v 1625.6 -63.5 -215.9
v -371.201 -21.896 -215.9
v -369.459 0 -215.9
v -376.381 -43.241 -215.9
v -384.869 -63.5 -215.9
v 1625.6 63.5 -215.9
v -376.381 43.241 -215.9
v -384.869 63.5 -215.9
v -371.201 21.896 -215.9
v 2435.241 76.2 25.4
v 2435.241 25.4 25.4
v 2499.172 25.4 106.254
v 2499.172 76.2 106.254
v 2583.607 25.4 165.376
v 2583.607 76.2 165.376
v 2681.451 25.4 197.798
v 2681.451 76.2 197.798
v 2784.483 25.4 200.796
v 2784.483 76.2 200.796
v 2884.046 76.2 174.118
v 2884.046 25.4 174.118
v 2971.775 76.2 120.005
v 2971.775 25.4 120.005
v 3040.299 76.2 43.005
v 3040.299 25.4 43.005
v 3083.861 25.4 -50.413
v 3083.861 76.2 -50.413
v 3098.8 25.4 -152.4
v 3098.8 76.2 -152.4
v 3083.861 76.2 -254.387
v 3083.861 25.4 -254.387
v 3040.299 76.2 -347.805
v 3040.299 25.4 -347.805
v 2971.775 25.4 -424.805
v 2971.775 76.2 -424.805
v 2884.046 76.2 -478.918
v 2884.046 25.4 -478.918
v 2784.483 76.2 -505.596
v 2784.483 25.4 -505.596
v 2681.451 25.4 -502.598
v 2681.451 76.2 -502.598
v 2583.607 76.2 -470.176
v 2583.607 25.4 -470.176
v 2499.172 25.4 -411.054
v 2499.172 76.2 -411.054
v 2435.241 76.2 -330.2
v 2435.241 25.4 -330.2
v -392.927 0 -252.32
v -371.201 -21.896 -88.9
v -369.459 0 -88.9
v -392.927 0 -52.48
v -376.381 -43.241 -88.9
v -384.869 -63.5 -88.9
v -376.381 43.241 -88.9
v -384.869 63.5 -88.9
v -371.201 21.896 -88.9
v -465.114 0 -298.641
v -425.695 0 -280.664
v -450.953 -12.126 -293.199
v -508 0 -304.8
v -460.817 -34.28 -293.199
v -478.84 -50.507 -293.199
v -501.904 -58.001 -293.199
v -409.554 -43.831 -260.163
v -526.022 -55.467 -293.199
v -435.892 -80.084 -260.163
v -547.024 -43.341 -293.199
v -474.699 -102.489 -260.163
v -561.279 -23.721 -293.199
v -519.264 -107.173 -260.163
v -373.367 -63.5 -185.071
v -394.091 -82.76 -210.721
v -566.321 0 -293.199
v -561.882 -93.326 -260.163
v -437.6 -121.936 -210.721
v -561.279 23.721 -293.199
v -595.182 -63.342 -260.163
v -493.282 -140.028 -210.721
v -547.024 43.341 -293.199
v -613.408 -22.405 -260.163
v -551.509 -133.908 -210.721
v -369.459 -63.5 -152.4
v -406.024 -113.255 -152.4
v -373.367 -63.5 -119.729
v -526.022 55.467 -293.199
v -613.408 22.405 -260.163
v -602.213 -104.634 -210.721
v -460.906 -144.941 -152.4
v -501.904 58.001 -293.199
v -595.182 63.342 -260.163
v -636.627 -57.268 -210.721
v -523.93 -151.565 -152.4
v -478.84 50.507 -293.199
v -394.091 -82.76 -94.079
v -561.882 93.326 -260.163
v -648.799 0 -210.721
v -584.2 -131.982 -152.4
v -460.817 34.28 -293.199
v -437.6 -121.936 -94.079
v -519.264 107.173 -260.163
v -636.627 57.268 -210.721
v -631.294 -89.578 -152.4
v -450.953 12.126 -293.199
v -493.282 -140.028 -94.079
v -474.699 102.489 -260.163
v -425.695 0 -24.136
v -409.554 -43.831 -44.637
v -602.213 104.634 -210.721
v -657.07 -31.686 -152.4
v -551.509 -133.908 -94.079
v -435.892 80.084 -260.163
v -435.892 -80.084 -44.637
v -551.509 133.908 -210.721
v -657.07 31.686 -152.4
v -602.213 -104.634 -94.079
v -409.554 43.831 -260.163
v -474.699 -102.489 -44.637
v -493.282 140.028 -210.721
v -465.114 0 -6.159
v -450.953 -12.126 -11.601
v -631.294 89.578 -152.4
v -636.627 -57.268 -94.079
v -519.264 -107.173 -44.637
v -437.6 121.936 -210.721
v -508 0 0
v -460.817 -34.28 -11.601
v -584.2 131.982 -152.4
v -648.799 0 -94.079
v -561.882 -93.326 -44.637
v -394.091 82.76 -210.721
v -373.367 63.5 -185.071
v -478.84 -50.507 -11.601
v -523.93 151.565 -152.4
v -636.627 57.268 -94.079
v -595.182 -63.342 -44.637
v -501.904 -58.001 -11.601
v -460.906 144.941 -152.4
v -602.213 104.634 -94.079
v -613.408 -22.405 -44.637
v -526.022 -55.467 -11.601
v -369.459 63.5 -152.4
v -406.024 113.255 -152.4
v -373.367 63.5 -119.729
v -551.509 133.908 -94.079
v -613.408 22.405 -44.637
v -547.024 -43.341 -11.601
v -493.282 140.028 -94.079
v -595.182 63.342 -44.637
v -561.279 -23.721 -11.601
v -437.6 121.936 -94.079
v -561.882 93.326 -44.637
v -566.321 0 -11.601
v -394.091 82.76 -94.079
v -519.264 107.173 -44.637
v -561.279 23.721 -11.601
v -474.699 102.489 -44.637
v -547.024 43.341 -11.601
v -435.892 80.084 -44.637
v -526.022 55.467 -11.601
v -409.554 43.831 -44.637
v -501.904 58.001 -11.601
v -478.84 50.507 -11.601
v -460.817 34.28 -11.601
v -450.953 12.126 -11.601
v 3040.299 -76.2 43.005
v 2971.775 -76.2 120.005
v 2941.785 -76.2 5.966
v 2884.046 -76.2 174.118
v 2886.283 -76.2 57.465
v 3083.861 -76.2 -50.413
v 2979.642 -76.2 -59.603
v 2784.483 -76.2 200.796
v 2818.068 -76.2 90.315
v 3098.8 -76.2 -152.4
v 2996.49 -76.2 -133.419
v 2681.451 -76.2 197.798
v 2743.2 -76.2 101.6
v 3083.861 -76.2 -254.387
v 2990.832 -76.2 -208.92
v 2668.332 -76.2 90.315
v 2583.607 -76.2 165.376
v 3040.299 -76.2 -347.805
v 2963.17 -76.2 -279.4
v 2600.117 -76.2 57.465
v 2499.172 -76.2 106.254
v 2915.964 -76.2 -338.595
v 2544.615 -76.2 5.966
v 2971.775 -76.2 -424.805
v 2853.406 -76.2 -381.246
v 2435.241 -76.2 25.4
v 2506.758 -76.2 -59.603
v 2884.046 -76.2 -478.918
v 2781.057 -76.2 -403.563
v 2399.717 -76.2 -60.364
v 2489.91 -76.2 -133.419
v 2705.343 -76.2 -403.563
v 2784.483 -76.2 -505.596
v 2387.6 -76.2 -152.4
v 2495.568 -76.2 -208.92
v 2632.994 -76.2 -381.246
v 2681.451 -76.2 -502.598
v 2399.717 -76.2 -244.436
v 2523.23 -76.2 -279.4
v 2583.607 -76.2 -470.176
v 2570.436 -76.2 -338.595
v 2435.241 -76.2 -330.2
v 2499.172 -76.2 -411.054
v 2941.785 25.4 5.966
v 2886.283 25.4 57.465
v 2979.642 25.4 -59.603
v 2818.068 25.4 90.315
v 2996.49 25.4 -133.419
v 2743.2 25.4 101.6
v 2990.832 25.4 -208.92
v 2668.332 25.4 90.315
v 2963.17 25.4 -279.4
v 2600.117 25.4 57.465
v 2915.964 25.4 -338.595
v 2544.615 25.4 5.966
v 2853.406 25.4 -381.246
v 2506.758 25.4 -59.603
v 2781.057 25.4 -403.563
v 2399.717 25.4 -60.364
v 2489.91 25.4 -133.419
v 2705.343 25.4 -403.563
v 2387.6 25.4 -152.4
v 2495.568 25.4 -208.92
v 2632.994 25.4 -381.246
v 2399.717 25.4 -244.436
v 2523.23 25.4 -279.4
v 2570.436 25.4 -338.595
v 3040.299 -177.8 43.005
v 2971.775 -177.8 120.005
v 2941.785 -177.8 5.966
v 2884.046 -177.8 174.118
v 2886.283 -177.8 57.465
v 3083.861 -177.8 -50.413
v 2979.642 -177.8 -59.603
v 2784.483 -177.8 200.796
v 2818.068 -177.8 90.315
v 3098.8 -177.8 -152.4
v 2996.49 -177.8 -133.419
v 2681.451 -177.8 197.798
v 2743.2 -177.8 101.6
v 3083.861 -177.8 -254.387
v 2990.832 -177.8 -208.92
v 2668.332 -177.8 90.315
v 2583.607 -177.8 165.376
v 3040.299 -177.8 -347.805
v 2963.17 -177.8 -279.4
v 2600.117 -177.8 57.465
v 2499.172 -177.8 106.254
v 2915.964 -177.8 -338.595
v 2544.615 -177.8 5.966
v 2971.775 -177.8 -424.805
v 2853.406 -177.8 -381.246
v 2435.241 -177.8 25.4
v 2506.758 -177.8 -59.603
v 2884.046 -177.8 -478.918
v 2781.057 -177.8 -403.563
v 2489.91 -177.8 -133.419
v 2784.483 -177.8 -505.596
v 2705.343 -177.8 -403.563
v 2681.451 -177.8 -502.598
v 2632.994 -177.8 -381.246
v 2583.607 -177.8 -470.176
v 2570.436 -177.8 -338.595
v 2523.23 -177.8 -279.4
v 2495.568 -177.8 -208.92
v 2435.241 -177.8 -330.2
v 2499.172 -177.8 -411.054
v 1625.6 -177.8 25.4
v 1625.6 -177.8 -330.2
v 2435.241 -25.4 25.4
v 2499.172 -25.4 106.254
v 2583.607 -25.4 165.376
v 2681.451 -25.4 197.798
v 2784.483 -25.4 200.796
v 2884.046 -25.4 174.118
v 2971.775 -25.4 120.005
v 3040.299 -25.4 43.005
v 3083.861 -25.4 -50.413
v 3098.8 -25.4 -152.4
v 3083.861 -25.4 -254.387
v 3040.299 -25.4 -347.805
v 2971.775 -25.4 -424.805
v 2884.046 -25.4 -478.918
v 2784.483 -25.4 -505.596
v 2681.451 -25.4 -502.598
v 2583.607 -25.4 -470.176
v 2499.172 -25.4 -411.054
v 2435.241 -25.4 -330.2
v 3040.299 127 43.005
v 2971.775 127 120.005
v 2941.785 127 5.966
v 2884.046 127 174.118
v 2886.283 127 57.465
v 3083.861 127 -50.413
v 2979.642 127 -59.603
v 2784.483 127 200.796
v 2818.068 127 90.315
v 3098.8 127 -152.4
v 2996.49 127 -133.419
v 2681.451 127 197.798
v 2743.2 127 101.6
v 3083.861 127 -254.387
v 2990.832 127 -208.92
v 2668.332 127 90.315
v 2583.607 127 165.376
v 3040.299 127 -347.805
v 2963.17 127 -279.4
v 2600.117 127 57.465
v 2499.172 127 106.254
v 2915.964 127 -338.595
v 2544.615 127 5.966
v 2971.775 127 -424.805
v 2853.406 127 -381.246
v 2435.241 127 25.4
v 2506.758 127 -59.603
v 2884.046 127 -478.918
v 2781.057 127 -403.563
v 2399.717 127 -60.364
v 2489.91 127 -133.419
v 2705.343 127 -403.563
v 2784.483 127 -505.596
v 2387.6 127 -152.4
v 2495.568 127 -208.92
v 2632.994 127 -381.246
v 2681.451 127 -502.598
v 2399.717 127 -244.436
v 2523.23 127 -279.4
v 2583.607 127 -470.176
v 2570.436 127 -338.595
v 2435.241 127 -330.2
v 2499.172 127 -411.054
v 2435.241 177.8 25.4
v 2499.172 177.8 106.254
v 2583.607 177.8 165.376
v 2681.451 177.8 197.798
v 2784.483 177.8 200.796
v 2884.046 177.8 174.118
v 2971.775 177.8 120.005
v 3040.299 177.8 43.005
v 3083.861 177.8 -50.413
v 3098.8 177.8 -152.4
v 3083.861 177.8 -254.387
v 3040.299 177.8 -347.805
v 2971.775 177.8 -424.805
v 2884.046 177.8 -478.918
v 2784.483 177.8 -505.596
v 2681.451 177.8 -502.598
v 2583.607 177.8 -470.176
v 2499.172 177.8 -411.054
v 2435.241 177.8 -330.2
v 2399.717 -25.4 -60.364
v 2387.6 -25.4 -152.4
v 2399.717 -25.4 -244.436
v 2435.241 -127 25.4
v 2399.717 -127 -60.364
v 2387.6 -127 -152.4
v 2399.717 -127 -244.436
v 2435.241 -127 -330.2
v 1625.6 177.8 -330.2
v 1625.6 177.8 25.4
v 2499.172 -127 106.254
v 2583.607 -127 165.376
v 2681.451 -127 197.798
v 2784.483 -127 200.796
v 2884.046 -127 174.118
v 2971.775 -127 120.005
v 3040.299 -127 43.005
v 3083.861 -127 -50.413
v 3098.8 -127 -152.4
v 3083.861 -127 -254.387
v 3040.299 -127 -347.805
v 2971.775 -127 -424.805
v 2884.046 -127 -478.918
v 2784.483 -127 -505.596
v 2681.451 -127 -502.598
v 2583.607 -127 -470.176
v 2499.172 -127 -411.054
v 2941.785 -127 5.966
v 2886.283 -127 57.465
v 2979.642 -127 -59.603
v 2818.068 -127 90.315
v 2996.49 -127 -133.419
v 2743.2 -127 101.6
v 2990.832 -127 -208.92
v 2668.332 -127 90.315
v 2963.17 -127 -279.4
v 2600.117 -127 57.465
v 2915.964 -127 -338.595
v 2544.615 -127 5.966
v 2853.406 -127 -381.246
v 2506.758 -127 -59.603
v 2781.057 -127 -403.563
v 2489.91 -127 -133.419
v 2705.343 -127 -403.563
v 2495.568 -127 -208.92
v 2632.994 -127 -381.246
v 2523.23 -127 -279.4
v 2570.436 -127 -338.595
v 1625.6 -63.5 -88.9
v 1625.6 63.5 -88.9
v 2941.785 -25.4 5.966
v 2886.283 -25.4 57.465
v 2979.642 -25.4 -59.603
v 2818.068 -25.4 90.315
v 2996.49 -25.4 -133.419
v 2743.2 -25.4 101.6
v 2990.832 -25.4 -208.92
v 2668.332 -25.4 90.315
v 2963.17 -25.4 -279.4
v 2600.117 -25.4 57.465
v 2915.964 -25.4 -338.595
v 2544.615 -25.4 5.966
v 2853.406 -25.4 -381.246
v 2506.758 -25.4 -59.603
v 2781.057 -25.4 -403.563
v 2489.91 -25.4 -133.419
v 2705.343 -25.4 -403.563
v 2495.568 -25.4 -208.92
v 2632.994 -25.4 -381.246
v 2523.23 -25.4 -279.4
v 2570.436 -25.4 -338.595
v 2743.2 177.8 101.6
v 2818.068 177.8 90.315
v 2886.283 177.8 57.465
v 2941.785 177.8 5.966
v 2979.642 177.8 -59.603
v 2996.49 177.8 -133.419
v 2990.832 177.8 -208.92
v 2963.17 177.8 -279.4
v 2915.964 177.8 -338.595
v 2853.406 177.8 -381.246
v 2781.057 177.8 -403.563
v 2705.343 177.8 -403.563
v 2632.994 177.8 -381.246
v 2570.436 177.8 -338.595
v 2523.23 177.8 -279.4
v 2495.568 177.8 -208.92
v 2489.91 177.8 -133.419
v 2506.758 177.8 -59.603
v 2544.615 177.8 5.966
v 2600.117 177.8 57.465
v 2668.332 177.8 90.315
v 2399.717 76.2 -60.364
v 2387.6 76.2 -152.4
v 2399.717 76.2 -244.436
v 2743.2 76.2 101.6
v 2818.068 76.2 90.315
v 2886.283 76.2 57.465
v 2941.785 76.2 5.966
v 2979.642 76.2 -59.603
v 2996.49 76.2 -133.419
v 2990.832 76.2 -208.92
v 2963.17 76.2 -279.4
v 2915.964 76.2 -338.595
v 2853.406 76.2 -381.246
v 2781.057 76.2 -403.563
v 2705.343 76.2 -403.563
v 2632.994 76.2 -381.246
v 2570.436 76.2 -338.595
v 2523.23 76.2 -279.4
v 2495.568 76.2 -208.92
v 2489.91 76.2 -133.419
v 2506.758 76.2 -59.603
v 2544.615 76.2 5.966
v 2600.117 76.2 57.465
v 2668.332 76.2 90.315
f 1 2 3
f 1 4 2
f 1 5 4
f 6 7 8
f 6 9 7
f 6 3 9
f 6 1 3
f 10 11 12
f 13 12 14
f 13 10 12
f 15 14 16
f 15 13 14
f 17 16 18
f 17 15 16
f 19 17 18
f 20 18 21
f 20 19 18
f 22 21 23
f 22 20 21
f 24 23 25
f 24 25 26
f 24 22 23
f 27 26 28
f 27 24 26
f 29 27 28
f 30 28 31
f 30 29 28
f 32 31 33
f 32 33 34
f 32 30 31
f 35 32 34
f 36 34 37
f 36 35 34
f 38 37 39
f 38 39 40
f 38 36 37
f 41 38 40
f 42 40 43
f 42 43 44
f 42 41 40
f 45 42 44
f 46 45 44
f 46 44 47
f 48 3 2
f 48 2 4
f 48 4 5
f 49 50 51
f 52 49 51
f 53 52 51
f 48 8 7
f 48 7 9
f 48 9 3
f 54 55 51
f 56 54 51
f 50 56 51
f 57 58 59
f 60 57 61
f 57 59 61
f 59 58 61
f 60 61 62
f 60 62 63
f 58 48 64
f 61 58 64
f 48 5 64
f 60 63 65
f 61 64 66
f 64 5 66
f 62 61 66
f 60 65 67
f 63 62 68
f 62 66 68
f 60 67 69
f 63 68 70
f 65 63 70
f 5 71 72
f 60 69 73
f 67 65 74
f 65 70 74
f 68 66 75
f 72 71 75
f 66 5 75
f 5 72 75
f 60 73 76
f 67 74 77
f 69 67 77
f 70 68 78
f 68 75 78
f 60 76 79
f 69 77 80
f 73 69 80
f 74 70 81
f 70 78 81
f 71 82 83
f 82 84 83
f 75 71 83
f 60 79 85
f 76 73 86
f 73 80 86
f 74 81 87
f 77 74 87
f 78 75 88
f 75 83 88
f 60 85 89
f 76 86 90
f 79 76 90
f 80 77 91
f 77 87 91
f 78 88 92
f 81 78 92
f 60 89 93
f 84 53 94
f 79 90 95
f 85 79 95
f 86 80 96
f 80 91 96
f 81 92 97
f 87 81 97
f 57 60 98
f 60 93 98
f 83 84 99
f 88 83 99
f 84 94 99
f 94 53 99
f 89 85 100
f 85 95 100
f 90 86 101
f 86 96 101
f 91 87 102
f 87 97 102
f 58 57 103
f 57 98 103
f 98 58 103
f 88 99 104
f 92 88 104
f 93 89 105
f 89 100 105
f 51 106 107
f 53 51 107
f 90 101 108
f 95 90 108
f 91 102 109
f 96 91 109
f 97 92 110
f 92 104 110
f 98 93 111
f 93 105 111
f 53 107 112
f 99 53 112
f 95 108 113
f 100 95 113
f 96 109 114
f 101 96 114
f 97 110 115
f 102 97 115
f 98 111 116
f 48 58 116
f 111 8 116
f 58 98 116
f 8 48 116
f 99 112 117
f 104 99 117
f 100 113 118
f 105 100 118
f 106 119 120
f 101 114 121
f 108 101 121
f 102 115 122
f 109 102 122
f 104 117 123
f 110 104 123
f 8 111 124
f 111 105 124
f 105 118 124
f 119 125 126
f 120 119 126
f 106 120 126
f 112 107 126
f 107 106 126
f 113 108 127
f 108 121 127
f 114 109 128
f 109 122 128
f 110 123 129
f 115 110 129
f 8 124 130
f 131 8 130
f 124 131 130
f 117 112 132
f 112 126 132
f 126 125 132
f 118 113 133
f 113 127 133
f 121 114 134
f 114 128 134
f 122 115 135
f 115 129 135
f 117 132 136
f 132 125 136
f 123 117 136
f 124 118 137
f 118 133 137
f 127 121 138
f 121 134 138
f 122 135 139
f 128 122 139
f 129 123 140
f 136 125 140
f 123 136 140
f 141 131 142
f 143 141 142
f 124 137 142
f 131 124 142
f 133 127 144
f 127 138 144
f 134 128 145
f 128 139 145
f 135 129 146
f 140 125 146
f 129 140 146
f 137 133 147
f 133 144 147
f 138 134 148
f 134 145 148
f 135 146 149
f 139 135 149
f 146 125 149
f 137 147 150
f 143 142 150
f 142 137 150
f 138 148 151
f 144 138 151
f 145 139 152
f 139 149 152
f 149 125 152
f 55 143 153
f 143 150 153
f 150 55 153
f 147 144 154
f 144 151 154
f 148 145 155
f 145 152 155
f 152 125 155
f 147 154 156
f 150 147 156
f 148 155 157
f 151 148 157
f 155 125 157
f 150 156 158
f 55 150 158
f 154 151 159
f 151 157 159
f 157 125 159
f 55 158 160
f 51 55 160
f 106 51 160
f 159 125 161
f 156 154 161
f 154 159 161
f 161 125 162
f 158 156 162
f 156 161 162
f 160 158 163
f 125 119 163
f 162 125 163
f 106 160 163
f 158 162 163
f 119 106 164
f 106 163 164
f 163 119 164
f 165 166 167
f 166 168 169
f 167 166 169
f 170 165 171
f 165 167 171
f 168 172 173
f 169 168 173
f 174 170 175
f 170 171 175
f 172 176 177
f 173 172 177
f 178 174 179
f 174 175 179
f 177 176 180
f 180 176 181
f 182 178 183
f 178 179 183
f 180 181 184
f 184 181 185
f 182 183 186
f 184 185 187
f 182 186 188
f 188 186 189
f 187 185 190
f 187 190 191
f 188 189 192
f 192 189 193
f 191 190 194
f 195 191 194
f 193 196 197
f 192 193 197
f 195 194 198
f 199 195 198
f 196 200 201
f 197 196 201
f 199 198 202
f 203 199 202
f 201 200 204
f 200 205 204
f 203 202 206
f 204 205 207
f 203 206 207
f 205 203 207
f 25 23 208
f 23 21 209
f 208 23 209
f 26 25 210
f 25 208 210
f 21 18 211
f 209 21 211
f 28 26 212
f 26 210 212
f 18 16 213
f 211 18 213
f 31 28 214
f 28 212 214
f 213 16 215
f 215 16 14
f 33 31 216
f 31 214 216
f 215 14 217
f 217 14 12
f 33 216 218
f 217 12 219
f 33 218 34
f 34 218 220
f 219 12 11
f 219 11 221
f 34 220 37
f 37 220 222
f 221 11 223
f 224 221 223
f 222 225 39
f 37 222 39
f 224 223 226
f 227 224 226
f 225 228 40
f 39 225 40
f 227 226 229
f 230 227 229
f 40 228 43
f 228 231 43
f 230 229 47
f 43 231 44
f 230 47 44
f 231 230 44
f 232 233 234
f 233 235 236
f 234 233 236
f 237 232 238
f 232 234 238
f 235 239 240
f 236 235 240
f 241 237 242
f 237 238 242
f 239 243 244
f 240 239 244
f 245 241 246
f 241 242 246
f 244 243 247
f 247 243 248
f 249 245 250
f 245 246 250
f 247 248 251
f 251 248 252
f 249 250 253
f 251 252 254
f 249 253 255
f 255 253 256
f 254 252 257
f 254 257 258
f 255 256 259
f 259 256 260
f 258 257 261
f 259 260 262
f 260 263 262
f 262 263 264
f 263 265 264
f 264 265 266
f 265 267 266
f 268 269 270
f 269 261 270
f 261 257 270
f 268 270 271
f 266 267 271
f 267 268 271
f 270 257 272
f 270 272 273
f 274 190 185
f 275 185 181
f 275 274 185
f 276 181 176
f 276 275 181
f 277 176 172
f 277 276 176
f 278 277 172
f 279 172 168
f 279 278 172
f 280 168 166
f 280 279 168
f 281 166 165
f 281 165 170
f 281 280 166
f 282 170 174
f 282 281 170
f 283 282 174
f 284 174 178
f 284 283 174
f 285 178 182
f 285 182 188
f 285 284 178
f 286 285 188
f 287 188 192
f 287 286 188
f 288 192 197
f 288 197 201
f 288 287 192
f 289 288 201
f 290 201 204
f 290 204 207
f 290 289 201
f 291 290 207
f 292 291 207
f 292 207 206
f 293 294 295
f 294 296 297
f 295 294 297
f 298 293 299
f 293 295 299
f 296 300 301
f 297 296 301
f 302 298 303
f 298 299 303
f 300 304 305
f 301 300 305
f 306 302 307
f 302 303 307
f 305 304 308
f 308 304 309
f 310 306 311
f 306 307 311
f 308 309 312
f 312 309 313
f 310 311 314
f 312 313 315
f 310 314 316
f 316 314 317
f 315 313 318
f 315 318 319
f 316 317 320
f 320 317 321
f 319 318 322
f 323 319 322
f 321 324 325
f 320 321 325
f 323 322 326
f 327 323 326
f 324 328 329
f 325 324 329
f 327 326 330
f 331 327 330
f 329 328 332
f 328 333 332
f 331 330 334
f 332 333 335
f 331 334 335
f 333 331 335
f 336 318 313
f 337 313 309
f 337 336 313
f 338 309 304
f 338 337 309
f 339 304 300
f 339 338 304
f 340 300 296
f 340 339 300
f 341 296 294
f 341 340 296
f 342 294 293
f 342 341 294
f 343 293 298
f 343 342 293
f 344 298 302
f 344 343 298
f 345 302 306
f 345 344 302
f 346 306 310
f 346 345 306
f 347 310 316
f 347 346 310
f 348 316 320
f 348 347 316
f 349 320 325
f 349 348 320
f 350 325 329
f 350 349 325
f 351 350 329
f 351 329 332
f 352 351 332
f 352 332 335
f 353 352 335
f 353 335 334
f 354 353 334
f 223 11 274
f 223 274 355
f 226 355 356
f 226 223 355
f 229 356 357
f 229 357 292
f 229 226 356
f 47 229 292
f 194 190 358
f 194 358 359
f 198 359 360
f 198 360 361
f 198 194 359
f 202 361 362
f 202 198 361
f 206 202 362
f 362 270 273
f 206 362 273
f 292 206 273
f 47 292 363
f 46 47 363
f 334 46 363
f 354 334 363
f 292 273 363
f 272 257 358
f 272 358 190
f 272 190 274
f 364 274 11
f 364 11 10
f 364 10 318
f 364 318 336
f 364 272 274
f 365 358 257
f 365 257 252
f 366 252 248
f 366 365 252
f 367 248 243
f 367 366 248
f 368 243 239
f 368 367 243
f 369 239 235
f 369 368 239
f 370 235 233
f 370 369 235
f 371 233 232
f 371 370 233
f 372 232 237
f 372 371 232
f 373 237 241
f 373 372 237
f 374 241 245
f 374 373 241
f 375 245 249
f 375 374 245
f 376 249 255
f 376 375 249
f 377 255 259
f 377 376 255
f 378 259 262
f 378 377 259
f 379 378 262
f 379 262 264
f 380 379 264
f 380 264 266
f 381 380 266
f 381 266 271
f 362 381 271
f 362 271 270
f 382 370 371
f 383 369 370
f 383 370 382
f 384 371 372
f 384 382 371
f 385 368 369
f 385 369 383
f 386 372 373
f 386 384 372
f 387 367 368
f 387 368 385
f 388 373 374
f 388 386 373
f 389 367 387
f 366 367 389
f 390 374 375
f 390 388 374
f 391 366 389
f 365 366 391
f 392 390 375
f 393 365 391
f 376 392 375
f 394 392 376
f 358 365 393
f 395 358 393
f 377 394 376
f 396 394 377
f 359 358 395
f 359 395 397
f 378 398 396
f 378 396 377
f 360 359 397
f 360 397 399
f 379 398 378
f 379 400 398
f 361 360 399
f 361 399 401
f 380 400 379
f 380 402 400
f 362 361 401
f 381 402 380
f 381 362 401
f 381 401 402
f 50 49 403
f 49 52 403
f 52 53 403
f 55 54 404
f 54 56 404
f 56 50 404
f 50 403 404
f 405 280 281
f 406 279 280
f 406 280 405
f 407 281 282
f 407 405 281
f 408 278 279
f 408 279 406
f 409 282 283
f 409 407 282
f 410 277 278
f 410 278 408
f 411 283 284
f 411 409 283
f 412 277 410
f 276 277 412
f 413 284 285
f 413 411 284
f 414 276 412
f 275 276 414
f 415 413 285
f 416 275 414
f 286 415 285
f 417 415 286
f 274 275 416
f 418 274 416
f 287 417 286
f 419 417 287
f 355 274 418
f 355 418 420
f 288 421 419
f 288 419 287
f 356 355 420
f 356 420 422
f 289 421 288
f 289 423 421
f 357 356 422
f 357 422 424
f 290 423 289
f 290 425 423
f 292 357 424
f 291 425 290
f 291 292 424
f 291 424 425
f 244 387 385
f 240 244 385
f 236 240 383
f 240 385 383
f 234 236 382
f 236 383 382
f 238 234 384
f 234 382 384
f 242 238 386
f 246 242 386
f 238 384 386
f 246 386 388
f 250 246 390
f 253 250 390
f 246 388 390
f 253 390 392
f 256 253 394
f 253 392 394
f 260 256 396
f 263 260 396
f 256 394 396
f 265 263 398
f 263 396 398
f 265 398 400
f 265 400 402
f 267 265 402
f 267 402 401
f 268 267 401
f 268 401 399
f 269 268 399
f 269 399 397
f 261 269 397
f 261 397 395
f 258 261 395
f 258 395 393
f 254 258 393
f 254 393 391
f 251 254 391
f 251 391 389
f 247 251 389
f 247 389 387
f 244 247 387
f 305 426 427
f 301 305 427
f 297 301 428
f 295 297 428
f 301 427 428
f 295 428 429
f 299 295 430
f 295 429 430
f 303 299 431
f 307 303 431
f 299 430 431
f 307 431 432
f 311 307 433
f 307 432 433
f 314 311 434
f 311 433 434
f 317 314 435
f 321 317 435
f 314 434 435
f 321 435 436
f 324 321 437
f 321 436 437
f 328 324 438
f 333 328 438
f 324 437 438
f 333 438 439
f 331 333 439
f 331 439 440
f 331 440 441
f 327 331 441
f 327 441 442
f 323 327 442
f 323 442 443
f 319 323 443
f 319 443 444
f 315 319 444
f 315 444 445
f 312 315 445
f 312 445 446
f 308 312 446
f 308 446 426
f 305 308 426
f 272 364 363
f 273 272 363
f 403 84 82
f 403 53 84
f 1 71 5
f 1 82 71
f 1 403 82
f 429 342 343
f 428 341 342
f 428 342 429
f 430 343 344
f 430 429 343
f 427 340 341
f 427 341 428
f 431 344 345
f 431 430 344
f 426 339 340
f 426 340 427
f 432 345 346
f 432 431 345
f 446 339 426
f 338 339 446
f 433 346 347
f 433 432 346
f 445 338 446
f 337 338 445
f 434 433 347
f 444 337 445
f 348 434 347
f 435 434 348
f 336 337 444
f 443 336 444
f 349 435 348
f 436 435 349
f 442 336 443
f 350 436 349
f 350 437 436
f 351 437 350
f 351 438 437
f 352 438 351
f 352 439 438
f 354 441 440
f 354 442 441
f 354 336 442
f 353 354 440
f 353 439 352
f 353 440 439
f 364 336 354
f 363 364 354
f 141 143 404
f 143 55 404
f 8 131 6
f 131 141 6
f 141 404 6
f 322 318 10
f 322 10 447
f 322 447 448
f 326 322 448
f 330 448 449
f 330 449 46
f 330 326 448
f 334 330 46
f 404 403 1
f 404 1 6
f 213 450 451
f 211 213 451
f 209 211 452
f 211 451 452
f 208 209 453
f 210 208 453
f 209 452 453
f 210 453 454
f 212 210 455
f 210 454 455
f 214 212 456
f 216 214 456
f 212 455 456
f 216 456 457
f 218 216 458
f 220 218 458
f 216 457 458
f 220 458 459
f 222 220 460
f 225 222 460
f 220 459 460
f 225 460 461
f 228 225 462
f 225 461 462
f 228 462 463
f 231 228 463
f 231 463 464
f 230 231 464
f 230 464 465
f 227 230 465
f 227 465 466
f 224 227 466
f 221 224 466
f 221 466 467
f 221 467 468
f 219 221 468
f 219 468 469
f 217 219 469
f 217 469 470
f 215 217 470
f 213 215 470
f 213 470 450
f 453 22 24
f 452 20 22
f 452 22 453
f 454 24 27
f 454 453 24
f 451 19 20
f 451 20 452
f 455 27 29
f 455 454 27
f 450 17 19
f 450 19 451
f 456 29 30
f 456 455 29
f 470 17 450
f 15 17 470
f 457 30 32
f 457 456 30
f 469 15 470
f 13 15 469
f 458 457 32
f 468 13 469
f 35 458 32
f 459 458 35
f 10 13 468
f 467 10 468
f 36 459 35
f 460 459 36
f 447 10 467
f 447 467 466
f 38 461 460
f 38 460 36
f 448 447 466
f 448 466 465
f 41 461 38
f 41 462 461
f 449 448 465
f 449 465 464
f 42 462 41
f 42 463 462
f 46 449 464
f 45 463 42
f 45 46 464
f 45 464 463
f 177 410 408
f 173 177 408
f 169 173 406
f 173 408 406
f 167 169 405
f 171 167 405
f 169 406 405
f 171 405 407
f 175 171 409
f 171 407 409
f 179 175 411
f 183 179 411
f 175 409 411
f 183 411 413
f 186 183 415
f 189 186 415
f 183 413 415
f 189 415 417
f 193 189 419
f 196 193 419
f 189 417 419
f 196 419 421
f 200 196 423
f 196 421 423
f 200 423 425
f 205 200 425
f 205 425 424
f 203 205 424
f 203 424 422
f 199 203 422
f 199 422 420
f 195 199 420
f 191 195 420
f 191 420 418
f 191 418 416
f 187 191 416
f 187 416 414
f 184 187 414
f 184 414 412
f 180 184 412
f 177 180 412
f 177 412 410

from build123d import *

# Parameters (mm, degrees)
SKETCH5_W                            = 127
SKETCH5_H                            = 127
BOSS_EXTRUDE1_DEPTH                  = 1625.6
BOSS_EXTRUDE1_DIRECTION_2_REACH      = 745.14
BOSS_EXTRUDE1_DIRECTION_2_END_RADIUS = 152.4
SKETCH6_W                            = 355.6
SKETCH6_H                            = 355.6
BOSS_EXTRUDE2_DEPTH                  = 762
SKETCH7_R                            = 355.6
BOSS_EXTRUDE3_DEPTH                  = 355.6
BOSS_EXTRUDE4_REACH                  = 3097.154
BOSS_EXTRUDE4_END_RADIUS             = 355.6
SKETCH8_W                            = 355.6
SKETCH8_H                            = 355.6
SKETCH9_R                            = 254
CUT_EXTRUDE1_DEPTH                   = 355.6
SKETCH11_W                           = 355.6
SKETCH11_H                           = 50.8


with BuildPart() as part:
    # Sketch3 → Revolve1 (revolve)
    with BuildSketch(Plane(origin=(0, 0, 0), x_dir=(1, 0, 0), z_dir=(0, 1, 0))):
        with BuildLine():
            Line((-508, 0), (-508, 304.8))
            ThreePointArc((-508, 304.8), (-355.6, 152.4), (-508, 0))
        make_face()
    revolve(axis=Axis((-508, 0, 0), (0, 0, -1)))

    # Sketch5 → Boss-Extrude1 (add)
    with BuildSketch(Plane(origin=(0, 0, 0), x_dir=(0, 0, -1), z_dir=(1, 0, 0))):
        with Locations((152.4, 0)):
            Rectangle(SKETCH5_W, SKETCH5_H)
    extrude(amount=BOSS_EXTRUDE1_DEPTH)

    # Boss-Extrude1 direction 2: up to this sphere (the profile starts outside it)
    boss_extrude1_direction_2_end = Location((-508, 0, -152.4)) * Sphere(BOSS_EXTRUDE1_DIRECTION_2_END_RADIUS, mode=Mode.PRIVATE)
    # Sketch5 → Boss-Extrude1 direction 2 (add, up to the surface)
    with BuildSketch(Plane(origin=(0, 0, 0), x_dir=(0, 0, -1), z_dir=(1, 0, 0)), mode=Mode.PRIVATE) as boss_extrude1_direction_2_sk1:
        with Locations((152.4, 0)):
            Rectangle(SKETCH5_W, SKETCH5_H)
    boss_extrude1_direction_2_tool1 = extrude(boss_extrude1_direction_2_sk1.sketch, amount=-BOSS_EXTRUDE1_DIRECTION_2_REACH, mode=Mode.PRIVATE) - boss_extrude1_direction_2_end
    add(boss_extrude1_direction_2_tool1.solids().sort_by_distance((0, 0, -152.4))[0])

    # Sketch6 → Boss-Extrude2 (add)
    with BuildSketch(Plane(origin=(1625.6, 0, 0), x_dir=(0, 0, -1), z_dir=(1, 0, 0))):
        with Locations((152.4, 0)):
            Rectangle(SKETCH6_W, SKETCH6_H)
    extrude(amount=BOSS_EXTRUDE2_DEPTH)



with BuildPart() as body_2:
    # Sketch7 → Boss-Extrude3 (new body)
    with BuildSketch(Plane(origin=(0, 177.8, 0), x_dir=(1, 0, 0), z_dir=(0, 1, 0))):
        with Locations((2743.2, 152.4)):
            Circle(SKETCH7_R)
    extrude(amount=-BOSS_EXTRUDE3_DEPTH)


with BuildPart() as part_1:
    add(part.part)

    add(body_2.part)  # Boss-Extrude4 merges body 2
    # Boss-Extrude4: up to this cylinder (the profile starts outside it)
    boss_extrude4_end = Plane(origin=(2743.2, 0, -152.4), z_dir=(0, 1, 0)) * Cylinder(BOSS_EXTRUDE4_END_RADIUS, 6906.508, mode=Mode.PRIVATE)
    # Sketch8 → Boss-Extrude4 (add, up to the surface)
    with BuildSketch(Plane(origin=(2387.6, 0, 0), x_dir=(0, 0, -1), z_dir=(1, 0, 0)), mode=Mode.PRIVATE) as boss_extrude4_sk1:
        with Locations((152.4, 0)):
            Rectangle(SKETCH8_W, SKETCH8_H)
    boss_extrude4_tool1 = extrude(boss_extrude4_sk1.sketch, amount=BOSS_EXTRUDE4_REACH, mode=Mode.PRIVATE) - boss_extrude4_end
    add(boss_extrude4_tool1.solids().sort_by_distance((2387.6, 0, -152.4))[0])
    add(boss_extrude4_tool1.solids().sort_by_distance((2387.6, 0, -152.4))[1])

    # Sketch9 → Cut-Extrude1 (cut)
    with BuildSketch(Plane(origin=(0, 177.8, 0), x_dir=(1, 0, 0), z_dir=(0, 1, 0))):
        with Locations((2743.2, 152.4)):
            Circle(SKETCH9_R)
    extrude(amount=-CUT_EXTRUDE1_DEPTH, mode=Mode.SUBTRACT)

    # Sketch11 → Cut-Revolve1 (revolve, cut)
    with BuildSketch(Plane.XY.offset(-152.4)):
        with Locations((2921, 101.6)):
            Rectangle(SKETCH11_W, SKETCH11_H)
        with Locations((2921, 0)):
            Rectangle(SKETCH11_W, SKETCH11_H)
        with Locations((2921, -101.6)):
            Rectangle(SKETCH11_W, SKETCH11_H)
    revolve(axis=Axis((2743.2, 177.8, -152.4), (0, -1, 0)), mode=Mode.SUBTRACT)


with BuildPart() as body_2_2:
    # Split1: the piece on the far side of the plane
    add(part_1.part)
    split(bisect_by=Plane(origin=(1625.6, 0, 0), x_dir=(0, 0, 1), z_dir=(1, 0, 0)), keep=Keep.BOTTOM)


with BuildPart() as part_2:
    add(part_1.part)

    # Split1
    split(bisect_by=Plane(origin=(1625.6, 0, 0), x_dir=(0, 0, 1), z_dir=(1, 0, 0)), keep=Keep.TOP)


solid = Compound([body_2_2.part, part_2.part])
